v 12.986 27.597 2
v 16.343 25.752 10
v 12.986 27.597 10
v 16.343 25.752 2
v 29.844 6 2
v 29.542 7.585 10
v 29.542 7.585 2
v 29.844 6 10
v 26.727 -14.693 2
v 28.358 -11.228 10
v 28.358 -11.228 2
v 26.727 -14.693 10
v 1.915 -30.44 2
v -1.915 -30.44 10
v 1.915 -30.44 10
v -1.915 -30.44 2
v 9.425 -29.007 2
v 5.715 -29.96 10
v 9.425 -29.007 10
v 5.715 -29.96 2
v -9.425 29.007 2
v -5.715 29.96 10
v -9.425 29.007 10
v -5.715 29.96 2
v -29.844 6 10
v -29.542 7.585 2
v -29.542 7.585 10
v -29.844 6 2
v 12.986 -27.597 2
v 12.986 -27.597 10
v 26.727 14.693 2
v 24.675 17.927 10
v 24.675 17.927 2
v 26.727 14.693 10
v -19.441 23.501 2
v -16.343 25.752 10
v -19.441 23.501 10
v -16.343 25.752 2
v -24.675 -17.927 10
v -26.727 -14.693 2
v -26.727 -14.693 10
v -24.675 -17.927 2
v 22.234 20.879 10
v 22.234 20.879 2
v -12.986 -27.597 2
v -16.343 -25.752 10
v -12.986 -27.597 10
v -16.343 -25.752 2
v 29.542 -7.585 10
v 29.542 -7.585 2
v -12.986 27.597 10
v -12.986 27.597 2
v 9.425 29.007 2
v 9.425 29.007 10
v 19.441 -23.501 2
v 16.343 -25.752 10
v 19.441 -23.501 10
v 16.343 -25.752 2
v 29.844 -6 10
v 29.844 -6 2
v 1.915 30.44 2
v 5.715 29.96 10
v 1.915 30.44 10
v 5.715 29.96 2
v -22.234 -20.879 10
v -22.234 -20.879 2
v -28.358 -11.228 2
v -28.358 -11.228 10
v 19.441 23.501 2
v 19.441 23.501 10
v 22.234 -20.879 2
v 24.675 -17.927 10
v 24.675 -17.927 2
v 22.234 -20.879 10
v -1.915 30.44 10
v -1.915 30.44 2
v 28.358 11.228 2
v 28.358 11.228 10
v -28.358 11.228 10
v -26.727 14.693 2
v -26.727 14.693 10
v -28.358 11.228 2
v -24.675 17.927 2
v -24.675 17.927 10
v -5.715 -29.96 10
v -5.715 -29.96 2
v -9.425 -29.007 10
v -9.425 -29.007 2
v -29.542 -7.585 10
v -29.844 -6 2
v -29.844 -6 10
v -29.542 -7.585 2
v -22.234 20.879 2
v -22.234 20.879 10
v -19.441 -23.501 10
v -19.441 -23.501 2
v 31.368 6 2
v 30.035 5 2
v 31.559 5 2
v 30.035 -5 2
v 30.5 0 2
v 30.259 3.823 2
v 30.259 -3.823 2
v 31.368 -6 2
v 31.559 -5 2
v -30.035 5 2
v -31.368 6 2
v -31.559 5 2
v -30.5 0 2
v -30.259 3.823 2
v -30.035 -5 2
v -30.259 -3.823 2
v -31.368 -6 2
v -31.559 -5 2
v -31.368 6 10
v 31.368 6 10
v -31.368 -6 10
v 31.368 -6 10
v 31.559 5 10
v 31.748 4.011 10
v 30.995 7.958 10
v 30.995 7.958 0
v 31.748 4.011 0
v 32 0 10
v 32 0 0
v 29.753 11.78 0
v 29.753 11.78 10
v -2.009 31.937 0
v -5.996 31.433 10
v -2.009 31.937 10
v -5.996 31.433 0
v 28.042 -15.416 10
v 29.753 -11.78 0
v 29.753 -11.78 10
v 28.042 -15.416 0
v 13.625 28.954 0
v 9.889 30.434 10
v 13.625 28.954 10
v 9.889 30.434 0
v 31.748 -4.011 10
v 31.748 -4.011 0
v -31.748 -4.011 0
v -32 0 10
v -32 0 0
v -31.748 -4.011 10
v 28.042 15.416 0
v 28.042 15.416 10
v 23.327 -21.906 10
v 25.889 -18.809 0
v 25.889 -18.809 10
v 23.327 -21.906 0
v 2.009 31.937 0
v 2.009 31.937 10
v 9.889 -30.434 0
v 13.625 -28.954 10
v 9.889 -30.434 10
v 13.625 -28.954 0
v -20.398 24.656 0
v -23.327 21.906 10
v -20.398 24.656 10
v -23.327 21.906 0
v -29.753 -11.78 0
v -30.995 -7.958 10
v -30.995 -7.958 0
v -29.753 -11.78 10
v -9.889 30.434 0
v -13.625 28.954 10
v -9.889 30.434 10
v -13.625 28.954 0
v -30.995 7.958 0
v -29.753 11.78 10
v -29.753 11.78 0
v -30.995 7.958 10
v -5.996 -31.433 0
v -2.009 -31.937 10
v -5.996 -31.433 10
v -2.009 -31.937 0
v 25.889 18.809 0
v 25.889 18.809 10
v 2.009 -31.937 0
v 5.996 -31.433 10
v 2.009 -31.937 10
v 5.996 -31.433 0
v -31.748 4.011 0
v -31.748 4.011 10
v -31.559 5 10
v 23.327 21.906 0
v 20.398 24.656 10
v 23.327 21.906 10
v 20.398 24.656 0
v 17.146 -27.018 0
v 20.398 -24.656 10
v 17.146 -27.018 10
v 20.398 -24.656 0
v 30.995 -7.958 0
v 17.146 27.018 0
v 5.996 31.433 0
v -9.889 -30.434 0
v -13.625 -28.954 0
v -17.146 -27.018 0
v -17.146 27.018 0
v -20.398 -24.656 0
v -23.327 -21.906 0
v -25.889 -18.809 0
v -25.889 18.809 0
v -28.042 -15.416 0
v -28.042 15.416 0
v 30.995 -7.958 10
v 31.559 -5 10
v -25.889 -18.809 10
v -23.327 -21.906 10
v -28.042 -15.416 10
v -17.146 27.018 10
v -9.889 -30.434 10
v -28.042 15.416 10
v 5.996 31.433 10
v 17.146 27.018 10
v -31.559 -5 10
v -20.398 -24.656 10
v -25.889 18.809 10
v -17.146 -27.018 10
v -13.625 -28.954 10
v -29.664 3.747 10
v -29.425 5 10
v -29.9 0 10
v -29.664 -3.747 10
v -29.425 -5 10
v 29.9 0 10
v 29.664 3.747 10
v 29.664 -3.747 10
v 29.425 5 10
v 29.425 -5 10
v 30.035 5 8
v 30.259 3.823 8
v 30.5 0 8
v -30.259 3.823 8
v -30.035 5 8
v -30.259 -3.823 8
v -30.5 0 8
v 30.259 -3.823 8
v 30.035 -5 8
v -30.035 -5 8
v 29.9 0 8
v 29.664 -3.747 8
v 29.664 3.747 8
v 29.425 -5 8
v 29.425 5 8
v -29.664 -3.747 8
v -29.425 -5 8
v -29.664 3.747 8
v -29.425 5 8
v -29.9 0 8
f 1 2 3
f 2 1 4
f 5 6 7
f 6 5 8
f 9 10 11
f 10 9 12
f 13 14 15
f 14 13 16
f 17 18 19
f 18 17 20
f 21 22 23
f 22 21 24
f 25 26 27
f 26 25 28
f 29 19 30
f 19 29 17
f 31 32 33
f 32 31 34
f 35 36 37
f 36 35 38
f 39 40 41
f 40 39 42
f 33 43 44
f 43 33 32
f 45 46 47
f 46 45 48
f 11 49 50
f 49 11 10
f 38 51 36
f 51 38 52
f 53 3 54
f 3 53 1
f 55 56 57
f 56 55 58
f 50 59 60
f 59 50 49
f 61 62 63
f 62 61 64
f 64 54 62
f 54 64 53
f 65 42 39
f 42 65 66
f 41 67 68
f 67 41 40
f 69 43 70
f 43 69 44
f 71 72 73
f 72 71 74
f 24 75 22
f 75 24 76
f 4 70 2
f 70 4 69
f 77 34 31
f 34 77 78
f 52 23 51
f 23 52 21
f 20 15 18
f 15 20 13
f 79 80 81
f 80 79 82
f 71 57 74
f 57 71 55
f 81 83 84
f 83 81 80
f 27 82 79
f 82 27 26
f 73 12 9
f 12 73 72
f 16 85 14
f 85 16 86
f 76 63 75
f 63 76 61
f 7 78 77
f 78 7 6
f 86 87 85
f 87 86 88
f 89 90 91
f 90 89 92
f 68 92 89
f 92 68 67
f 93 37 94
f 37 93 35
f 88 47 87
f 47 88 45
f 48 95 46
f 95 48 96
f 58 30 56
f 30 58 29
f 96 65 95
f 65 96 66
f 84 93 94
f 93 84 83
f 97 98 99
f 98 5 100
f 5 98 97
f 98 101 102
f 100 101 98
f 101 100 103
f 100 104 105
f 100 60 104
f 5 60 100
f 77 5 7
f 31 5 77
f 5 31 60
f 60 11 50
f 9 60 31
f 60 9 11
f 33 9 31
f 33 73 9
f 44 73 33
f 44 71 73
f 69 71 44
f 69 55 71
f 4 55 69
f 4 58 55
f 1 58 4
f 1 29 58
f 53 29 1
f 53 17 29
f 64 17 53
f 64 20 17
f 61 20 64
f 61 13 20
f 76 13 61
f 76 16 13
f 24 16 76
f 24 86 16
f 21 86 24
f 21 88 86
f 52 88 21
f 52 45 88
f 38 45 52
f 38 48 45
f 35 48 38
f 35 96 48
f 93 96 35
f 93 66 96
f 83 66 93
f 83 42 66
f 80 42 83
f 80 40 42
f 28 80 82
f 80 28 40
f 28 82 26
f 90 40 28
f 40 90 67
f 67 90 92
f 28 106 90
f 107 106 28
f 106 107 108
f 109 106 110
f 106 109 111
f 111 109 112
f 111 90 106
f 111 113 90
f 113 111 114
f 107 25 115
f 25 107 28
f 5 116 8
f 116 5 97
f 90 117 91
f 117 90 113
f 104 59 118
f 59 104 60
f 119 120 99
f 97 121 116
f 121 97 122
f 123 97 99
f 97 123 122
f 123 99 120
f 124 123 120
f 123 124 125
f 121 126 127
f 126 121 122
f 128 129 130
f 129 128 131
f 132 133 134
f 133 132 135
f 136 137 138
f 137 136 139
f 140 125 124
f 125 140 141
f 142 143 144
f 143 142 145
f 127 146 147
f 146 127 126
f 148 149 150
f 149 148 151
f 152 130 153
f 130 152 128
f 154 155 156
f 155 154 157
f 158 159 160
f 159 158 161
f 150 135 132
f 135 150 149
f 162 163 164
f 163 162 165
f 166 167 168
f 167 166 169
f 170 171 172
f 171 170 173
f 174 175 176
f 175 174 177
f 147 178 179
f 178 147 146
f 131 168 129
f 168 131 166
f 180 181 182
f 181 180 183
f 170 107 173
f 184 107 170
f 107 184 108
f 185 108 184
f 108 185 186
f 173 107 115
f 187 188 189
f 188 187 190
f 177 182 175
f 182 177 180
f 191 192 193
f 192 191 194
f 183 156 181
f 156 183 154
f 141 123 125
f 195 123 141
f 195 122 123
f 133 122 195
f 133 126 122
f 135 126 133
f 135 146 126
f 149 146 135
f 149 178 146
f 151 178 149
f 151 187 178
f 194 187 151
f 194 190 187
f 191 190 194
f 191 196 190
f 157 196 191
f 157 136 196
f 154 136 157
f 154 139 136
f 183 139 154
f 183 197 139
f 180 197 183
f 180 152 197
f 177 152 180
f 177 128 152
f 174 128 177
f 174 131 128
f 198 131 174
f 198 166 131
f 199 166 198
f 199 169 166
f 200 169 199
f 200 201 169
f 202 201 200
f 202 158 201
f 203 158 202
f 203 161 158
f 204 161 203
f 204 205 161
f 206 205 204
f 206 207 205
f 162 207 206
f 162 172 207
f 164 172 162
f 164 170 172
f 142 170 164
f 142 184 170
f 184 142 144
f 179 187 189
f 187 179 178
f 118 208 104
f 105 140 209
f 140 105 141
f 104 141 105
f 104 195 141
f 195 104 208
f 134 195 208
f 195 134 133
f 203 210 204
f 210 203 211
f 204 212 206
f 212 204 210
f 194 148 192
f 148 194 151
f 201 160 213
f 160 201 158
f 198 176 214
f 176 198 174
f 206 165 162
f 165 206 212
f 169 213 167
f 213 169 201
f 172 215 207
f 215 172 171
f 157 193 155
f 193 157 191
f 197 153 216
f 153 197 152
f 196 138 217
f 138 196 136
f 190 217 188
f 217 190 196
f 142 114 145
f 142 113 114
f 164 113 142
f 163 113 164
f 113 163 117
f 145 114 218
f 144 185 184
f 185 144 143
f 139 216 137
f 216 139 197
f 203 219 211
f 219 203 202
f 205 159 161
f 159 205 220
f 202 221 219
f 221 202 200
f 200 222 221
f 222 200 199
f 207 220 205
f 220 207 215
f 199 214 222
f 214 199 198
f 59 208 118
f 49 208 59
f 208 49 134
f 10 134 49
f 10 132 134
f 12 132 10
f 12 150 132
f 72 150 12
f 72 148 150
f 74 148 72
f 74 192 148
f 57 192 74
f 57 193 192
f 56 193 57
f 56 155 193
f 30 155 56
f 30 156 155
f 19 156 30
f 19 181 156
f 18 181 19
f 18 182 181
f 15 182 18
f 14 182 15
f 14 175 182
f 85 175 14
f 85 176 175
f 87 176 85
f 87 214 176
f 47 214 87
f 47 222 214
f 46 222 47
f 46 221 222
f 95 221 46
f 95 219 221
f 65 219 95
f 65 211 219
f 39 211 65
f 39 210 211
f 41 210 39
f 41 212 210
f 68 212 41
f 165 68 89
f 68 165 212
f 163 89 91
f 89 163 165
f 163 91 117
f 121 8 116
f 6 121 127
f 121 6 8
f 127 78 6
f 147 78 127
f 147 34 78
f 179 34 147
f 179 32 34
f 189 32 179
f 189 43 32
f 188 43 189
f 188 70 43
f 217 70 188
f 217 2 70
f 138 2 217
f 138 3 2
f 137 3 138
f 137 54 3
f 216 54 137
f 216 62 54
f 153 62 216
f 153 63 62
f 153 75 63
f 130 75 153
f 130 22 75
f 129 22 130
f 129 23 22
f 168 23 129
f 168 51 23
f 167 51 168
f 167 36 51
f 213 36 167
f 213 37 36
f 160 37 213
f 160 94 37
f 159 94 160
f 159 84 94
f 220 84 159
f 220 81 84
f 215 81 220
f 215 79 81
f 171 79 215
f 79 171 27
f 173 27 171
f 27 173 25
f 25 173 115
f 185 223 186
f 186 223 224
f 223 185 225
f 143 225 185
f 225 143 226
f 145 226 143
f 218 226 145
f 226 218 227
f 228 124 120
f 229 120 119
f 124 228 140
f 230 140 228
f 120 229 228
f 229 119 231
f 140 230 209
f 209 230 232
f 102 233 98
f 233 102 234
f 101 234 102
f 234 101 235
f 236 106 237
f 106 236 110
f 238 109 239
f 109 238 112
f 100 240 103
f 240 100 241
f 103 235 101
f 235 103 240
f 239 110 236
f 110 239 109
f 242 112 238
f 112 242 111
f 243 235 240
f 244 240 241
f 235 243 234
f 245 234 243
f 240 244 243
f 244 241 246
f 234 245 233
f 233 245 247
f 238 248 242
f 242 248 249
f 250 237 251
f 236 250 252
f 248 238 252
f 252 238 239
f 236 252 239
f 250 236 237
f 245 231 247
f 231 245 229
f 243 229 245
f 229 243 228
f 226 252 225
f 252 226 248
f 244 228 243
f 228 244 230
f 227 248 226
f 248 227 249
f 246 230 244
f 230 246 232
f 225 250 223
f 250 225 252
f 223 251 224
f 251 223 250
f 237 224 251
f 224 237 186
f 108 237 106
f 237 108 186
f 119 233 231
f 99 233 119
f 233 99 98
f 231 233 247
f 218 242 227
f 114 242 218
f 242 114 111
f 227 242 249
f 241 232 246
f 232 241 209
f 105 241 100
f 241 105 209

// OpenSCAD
// number of segments
$fn = 50;
// inner diameter
inner_diameter = 30;
// cap height. So far, bottom is always 2mm, border is 1mm
cap_height = 10;
// width of the clamps
clamp_width = 10;


module gripper(inner=30,height=10,clampwidth=10) {
	intersection() {
		translate([0,0,5]) cube([inner*2+4,clampwidth,height],center=true);
		difference() {
			cylinder(r=inner+2,h=height);
			cylinder(r=inner+.5,h=height-2);
			cylinder(r=inner-.1,h=height+1);
		}
	}
}
module cap(inner=30,height=10,clampwidth=10) {
difference() {
cylinder(r=inner+2,h=height);
	translate([0,0,2]) {
		cylinder(r=inner + 0.5,h=height);
		translate([0,0,5]) cube([inner*2+4,clampwidth+2,height],center=true);
	}
}
gripper(inner=inner,height=height,clampwidth=clampwidth);
}


cap(inner=inner_diameter, height=cap_height, clampwidth=clamp_width);
